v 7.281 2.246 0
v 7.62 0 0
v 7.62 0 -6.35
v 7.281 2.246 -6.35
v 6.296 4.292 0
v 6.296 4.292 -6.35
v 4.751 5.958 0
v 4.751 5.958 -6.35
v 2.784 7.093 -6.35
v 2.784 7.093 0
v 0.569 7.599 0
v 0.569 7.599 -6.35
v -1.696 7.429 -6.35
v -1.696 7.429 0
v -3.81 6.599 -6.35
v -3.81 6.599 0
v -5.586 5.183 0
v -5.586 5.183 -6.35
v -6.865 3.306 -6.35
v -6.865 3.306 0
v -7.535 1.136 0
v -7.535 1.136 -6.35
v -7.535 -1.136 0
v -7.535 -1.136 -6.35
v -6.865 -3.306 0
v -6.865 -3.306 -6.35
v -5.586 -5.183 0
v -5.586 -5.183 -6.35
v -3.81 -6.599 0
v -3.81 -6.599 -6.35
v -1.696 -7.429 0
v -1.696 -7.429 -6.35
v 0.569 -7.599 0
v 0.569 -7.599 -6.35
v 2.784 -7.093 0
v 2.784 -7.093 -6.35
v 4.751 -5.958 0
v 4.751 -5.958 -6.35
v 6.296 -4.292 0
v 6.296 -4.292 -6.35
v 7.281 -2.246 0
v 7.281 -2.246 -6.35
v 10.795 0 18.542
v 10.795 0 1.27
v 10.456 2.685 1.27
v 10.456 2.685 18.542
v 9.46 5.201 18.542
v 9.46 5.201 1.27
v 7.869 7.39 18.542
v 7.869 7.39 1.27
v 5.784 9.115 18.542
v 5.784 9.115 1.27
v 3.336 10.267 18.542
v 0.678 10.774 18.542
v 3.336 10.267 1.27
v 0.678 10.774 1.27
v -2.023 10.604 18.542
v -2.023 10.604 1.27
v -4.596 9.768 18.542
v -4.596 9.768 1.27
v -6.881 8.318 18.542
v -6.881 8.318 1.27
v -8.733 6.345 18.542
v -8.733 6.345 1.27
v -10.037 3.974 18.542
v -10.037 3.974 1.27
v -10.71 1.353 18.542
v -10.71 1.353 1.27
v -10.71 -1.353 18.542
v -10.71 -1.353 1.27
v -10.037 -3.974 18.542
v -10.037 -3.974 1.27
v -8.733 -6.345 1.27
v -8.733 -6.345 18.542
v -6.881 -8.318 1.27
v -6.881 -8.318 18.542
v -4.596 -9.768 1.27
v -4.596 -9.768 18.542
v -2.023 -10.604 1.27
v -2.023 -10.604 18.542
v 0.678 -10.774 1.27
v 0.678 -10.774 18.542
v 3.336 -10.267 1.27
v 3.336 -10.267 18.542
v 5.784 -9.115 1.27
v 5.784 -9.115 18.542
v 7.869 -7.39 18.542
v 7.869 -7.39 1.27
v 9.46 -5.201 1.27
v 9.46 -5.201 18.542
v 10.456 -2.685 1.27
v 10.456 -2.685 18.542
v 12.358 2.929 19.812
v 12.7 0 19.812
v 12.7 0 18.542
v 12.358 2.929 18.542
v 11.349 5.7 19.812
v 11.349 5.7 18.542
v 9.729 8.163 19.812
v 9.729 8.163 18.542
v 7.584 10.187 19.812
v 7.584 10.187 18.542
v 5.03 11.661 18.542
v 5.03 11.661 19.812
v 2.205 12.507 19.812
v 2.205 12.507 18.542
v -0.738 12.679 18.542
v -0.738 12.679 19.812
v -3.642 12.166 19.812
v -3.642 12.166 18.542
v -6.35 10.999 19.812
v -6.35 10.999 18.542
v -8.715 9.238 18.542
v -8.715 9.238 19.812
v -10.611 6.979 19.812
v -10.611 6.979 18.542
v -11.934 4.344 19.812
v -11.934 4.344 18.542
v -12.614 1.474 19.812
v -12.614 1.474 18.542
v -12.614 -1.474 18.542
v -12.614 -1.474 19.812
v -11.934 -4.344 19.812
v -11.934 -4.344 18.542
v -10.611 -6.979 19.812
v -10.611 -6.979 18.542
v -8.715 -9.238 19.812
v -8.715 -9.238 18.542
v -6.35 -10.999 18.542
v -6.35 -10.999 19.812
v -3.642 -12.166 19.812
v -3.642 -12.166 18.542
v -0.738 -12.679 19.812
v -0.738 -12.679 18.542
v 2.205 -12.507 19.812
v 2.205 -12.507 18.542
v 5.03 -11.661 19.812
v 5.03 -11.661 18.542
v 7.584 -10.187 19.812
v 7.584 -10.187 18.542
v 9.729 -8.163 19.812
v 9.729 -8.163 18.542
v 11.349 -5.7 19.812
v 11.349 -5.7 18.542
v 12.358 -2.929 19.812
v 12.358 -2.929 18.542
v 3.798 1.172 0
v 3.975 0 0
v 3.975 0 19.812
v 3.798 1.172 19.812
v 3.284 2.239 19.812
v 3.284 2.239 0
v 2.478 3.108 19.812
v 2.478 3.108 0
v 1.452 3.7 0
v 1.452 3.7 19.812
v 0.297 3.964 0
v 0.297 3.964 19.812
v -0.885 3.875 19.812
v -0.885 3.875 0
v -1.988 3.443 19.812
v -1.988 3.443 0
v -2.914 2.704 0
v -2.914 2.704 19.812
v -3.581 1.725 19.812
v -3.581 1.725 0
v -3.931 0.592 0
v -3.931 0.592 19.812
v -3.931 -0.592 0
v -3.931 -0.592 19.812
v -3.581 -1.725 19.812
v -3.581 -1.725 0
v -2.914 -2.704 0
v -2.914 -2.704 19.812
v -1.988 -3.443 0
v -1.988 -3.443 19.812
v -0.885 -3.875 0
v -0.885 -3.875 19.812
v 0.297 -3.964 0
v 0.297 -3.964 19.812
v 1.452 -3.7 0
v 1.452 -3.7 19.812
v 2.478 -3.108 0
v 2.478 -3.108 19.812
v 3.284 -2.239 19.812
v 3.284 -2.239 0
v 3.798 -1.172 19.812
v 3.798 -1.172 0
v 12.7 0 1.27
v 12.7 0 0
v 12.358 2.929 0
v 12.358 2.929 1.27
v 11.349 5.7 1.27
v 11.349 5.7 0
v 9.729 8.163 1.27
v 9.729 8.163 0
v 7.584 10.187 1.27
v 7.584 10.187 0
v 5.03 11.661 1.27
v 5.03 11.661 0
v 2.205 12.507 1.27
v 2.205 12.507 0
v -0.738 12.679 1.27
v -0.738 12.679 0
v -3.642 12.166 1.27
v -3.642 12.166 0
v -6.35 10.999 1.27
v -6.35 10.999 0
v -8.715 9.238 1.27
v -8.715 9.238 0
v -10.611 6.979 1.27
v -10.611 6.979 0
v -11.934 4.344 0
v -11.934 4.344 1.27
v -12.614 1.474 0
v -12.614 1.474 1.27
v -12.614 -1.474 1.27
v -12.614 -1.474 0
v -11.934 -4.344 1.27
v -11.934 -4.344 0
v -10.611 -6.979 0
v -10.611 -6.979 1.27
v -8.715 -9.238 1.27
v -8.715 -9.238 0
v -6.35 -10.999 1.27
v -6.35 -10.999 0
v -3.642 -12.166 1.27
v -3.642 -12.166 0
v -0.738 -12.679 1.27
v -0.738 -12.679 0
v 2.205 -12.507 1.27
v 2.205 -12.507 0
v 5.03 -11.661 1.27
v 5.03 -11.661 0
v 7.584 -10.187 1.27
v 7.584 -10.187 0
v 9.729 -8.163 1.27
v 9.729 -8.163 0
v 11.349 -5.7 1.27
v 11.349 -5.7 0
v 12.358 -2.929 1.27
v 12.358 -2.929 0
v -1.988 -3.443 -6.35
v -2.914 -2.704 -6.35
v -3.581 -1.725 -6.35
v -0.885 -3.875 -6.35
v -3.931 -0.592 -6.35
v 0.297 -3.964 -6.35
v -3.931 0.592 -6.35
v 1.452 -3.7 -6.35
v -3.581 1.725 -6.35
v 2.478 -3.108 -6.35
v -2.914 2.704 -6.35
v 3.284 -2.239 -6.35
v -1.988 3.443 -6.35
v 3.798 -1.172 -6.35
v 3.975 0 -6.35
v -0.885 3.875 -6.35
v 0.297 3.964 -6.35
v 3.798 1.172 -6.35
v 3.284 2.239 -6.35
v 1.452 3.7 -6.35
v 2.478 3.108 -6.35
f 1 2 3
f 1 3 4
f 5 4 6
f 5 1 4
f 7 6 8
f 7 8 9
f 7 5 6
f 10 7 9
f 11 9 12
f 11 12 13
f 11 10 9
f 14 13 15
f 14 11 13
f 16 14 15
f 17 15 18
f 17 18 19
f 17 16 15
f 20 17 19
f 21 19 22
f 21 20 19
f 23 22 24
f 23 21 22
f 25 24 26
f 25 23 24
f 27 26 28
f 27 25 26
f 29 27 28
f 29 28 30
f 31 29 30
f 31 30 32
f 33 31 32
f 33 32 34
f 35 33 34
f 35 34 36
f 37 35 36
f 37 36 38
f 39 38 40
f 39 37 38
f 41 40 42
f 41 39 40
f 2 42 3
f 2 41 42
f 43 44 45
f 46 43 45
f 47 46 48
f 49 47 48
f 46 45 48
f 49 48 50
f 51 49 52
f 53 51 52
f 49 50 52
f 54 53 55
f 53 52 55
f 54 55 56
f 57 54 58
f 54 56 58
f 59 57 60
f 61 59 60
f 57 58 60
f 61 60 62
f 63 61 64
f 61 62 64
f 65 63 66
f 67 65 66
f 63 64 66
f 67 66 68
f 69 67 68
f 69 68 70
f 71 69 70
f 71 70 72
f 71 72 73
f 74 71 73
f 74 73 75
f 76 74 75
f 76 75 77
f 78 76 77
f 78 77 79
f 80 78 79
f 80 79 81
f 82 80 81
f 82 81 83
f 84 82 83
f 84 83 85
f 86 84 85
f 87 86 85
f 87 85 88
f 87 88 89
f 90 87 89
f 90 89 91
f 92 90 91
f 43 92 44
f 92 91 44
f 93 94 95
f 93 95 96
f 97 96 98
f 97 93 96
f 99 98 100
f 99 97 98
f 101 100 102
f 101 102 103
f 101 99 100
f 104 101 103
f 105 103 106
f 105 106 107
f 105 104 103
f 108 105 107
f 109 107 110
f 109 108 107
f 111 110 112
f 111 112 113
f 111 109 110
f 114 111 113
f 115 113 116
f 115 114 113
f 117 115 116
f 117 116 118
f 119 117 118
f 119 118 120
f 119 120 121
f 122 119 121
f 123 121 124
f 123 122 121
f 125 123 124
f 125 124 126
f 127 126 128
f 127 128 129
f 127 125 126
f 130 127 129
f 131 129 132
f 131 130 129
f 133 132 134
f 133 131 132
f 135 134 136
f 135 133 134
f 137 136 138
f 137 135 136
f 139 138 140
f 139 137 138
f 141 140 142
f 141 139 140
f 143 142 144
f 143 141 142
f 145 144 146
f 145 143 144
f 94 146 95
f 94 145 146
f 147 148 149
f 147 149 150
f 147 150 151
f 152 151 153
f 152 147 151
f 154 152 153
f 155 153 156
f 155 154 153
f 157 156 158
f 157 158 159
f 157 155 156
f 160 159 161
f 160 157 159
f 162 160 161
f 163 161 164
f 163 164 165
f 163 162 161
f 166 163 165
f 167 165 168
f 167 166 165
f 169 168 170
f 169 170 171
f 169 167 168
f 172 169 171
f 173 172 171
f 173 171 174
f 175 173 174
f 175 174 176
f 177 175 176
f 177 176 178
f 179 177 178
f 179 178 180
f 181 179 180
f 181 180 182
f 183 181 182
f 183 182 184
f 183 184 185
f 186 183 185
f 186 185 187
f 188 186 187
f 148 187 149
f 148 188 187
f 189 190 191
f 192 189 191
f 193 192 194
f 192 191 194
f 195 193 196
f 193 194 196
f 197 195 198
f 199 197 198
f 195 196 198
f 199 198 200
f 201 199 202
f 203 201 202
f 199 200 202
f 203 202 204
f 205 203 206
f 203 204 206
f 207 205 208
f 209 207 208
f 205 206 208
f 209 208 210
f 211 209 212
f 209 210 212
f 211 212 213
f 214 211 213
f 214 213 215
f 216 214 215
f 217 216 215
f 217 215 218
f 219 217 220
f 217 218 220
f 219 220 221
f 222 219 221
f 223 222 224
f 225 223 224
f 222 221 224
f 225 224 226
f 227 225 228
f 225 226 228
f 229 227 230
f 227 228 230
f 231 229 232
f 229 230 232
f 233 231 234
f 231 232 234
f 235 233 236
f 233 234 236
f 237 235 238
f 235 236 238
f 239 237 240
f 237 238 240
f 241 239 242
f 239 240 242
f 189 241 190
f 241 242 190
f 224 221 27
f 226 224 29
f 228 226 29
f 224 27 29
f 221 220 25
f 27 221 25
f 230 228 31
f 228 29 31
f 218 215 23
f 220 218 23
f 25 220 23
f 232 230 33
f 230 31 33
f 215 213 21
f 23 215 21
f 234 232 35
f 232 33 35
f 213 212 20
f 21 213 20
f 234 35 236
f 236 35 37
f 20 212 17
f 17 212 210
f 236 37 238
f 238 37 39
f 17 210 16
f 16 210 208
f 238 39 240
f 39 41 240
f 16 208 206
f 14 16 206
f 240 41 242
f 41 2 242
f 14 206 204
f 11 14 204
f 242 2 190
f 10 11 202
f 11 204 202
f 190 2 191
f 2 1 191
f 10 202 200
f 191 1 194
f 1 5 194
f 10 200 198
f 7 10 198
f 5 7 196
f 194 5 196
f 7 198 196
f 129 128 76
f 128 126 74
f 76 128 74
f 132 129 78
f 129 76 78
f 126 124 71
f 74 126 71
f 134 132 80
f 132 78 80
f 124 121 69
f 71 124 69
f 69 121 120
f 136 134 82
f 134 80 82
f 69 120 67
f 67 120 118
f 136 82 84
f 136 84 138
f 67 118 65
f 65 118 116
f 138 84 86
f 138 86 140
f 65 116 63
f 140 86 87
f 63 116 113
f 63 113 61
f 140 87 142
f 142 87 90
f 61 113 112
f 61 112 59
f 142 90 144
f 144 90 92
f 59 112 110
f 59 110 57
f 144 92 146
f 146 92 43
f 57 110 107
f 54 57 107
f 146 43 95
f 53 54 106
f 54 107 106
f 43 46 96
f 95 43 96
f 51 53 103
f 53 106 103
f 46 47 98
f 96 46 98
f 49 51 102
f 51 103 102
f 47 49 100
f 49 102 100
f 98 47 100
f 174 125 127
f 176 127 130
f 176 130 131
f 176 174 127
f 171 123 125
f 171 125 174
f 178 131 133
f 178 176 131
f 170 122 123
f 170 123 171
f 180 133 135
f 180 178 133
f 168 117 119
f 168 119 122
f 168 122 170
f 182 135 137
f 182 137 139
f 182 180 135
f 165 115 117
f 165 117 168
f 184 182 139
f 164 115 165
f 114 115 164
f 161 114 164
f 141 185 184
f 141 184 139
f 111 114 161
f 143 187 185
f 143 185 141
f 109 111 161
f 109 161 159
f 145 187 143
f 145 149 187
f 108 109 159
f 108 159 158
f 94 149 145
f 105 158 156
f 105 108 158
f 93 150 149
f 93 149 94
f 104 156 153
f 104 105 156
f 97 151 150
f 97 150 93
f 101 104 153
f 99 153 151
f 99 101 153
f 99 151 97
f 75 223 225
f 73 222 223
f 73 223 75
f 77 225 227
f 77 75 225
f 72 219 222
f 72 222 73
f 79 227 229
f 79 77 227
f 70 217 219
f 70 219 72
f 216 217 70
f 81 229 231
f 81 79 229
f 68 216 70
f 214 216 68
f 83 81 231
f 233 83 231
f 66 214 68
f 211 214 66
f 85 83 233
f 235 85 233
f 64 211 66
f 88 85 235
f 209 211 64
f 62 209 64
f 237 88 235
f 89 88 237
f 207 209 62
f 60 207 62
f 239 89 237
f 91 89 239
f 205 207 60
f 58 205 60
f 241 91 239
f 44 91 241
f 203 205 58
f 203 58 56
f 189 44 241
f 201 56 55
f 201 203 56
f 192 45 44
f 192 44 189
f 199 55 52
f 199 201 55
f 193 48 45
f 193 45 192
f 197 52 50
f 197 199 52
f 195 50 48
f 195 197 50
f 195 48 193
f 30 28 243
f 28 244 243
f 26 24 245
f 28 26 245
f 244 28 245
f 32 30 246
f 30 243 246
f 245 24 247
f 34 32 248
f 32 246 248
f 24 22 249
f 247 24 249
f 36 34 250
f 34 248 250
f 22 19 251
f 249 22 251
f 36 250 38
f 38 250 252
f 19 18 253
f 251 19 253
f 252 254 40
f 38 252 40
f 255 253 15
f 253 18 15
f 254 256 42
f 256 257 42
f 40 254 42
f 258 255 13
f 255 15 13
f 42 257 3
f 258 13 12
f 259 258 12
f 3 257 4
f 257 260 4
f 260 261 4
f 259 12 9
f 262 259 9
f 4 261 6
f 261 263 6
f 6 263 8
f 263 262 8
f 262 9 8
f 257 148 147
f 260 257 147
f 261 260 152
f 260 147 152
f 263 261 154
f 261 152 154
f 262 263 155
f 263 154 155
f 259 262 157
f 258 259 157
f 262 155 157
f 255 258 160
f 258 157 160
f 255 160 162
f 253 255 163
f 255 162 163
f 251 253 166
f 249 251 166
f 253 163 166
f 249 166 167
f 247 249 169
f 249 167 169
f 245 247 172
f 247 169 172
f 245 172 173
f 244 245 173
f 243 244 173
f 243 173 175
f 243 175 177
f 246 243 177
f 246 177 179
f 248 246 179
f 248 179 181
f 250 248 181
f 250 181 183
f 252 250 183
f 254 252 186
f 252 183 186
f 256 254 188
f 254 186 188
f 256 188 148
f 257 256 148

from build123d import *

# Parameters (mm, degrees)
F0_R     = 12.7
F0_R_2   = 10.795
F1_DEPTH = 1.27
F0_R_3   = 7.62
F0_R_4   = 3.9751
F2_DEPTH = 19.812
F3_R     = 12.7
F3_R_2   = 10.795
F4_DEPTH = 1.27
F5_DEPTH = 6.35


with BuildPart() as f1:
    # F0 (on Top) → F1 (new body)
    with BuildSketch(Plane.XY):
        Circle(F0_R)
        Circle(F0_R_2, mode=Mode.SUBTRACT)
    extrude(amount=F1_DEPTH)

    # F0 (on Top) → F2 (join)
    with BuildSketch(Plane.XY):
        Circle(F0_R_2)
        Circle(F0_R_3, mode=Mode.SUBTRACT)
        Circle(F0_R_3)
        Circle(F0_R_4, mode=Mode.SUBTRACT)
    extrude(amount=F2_DEPTH)

    # F3 (on face) → F4 (join)
    with BuildSketch(Plane.XY.offset(19.812)):
        Circle(F3_R)
        Circle(F3_R_2, mode=Mode.SUBTRACT)
    extrude(amount=-F4_DEPTH)

    # F0 (on Top) → F5 (join)
    with BuildSketch(Plane.XY):
        Circle(F0_R_3)
        Circle(F0_R_4, mode=Mode.SUBTRACT)
    extrude(amount=-F5_DEPTH)


solid = f1.part
